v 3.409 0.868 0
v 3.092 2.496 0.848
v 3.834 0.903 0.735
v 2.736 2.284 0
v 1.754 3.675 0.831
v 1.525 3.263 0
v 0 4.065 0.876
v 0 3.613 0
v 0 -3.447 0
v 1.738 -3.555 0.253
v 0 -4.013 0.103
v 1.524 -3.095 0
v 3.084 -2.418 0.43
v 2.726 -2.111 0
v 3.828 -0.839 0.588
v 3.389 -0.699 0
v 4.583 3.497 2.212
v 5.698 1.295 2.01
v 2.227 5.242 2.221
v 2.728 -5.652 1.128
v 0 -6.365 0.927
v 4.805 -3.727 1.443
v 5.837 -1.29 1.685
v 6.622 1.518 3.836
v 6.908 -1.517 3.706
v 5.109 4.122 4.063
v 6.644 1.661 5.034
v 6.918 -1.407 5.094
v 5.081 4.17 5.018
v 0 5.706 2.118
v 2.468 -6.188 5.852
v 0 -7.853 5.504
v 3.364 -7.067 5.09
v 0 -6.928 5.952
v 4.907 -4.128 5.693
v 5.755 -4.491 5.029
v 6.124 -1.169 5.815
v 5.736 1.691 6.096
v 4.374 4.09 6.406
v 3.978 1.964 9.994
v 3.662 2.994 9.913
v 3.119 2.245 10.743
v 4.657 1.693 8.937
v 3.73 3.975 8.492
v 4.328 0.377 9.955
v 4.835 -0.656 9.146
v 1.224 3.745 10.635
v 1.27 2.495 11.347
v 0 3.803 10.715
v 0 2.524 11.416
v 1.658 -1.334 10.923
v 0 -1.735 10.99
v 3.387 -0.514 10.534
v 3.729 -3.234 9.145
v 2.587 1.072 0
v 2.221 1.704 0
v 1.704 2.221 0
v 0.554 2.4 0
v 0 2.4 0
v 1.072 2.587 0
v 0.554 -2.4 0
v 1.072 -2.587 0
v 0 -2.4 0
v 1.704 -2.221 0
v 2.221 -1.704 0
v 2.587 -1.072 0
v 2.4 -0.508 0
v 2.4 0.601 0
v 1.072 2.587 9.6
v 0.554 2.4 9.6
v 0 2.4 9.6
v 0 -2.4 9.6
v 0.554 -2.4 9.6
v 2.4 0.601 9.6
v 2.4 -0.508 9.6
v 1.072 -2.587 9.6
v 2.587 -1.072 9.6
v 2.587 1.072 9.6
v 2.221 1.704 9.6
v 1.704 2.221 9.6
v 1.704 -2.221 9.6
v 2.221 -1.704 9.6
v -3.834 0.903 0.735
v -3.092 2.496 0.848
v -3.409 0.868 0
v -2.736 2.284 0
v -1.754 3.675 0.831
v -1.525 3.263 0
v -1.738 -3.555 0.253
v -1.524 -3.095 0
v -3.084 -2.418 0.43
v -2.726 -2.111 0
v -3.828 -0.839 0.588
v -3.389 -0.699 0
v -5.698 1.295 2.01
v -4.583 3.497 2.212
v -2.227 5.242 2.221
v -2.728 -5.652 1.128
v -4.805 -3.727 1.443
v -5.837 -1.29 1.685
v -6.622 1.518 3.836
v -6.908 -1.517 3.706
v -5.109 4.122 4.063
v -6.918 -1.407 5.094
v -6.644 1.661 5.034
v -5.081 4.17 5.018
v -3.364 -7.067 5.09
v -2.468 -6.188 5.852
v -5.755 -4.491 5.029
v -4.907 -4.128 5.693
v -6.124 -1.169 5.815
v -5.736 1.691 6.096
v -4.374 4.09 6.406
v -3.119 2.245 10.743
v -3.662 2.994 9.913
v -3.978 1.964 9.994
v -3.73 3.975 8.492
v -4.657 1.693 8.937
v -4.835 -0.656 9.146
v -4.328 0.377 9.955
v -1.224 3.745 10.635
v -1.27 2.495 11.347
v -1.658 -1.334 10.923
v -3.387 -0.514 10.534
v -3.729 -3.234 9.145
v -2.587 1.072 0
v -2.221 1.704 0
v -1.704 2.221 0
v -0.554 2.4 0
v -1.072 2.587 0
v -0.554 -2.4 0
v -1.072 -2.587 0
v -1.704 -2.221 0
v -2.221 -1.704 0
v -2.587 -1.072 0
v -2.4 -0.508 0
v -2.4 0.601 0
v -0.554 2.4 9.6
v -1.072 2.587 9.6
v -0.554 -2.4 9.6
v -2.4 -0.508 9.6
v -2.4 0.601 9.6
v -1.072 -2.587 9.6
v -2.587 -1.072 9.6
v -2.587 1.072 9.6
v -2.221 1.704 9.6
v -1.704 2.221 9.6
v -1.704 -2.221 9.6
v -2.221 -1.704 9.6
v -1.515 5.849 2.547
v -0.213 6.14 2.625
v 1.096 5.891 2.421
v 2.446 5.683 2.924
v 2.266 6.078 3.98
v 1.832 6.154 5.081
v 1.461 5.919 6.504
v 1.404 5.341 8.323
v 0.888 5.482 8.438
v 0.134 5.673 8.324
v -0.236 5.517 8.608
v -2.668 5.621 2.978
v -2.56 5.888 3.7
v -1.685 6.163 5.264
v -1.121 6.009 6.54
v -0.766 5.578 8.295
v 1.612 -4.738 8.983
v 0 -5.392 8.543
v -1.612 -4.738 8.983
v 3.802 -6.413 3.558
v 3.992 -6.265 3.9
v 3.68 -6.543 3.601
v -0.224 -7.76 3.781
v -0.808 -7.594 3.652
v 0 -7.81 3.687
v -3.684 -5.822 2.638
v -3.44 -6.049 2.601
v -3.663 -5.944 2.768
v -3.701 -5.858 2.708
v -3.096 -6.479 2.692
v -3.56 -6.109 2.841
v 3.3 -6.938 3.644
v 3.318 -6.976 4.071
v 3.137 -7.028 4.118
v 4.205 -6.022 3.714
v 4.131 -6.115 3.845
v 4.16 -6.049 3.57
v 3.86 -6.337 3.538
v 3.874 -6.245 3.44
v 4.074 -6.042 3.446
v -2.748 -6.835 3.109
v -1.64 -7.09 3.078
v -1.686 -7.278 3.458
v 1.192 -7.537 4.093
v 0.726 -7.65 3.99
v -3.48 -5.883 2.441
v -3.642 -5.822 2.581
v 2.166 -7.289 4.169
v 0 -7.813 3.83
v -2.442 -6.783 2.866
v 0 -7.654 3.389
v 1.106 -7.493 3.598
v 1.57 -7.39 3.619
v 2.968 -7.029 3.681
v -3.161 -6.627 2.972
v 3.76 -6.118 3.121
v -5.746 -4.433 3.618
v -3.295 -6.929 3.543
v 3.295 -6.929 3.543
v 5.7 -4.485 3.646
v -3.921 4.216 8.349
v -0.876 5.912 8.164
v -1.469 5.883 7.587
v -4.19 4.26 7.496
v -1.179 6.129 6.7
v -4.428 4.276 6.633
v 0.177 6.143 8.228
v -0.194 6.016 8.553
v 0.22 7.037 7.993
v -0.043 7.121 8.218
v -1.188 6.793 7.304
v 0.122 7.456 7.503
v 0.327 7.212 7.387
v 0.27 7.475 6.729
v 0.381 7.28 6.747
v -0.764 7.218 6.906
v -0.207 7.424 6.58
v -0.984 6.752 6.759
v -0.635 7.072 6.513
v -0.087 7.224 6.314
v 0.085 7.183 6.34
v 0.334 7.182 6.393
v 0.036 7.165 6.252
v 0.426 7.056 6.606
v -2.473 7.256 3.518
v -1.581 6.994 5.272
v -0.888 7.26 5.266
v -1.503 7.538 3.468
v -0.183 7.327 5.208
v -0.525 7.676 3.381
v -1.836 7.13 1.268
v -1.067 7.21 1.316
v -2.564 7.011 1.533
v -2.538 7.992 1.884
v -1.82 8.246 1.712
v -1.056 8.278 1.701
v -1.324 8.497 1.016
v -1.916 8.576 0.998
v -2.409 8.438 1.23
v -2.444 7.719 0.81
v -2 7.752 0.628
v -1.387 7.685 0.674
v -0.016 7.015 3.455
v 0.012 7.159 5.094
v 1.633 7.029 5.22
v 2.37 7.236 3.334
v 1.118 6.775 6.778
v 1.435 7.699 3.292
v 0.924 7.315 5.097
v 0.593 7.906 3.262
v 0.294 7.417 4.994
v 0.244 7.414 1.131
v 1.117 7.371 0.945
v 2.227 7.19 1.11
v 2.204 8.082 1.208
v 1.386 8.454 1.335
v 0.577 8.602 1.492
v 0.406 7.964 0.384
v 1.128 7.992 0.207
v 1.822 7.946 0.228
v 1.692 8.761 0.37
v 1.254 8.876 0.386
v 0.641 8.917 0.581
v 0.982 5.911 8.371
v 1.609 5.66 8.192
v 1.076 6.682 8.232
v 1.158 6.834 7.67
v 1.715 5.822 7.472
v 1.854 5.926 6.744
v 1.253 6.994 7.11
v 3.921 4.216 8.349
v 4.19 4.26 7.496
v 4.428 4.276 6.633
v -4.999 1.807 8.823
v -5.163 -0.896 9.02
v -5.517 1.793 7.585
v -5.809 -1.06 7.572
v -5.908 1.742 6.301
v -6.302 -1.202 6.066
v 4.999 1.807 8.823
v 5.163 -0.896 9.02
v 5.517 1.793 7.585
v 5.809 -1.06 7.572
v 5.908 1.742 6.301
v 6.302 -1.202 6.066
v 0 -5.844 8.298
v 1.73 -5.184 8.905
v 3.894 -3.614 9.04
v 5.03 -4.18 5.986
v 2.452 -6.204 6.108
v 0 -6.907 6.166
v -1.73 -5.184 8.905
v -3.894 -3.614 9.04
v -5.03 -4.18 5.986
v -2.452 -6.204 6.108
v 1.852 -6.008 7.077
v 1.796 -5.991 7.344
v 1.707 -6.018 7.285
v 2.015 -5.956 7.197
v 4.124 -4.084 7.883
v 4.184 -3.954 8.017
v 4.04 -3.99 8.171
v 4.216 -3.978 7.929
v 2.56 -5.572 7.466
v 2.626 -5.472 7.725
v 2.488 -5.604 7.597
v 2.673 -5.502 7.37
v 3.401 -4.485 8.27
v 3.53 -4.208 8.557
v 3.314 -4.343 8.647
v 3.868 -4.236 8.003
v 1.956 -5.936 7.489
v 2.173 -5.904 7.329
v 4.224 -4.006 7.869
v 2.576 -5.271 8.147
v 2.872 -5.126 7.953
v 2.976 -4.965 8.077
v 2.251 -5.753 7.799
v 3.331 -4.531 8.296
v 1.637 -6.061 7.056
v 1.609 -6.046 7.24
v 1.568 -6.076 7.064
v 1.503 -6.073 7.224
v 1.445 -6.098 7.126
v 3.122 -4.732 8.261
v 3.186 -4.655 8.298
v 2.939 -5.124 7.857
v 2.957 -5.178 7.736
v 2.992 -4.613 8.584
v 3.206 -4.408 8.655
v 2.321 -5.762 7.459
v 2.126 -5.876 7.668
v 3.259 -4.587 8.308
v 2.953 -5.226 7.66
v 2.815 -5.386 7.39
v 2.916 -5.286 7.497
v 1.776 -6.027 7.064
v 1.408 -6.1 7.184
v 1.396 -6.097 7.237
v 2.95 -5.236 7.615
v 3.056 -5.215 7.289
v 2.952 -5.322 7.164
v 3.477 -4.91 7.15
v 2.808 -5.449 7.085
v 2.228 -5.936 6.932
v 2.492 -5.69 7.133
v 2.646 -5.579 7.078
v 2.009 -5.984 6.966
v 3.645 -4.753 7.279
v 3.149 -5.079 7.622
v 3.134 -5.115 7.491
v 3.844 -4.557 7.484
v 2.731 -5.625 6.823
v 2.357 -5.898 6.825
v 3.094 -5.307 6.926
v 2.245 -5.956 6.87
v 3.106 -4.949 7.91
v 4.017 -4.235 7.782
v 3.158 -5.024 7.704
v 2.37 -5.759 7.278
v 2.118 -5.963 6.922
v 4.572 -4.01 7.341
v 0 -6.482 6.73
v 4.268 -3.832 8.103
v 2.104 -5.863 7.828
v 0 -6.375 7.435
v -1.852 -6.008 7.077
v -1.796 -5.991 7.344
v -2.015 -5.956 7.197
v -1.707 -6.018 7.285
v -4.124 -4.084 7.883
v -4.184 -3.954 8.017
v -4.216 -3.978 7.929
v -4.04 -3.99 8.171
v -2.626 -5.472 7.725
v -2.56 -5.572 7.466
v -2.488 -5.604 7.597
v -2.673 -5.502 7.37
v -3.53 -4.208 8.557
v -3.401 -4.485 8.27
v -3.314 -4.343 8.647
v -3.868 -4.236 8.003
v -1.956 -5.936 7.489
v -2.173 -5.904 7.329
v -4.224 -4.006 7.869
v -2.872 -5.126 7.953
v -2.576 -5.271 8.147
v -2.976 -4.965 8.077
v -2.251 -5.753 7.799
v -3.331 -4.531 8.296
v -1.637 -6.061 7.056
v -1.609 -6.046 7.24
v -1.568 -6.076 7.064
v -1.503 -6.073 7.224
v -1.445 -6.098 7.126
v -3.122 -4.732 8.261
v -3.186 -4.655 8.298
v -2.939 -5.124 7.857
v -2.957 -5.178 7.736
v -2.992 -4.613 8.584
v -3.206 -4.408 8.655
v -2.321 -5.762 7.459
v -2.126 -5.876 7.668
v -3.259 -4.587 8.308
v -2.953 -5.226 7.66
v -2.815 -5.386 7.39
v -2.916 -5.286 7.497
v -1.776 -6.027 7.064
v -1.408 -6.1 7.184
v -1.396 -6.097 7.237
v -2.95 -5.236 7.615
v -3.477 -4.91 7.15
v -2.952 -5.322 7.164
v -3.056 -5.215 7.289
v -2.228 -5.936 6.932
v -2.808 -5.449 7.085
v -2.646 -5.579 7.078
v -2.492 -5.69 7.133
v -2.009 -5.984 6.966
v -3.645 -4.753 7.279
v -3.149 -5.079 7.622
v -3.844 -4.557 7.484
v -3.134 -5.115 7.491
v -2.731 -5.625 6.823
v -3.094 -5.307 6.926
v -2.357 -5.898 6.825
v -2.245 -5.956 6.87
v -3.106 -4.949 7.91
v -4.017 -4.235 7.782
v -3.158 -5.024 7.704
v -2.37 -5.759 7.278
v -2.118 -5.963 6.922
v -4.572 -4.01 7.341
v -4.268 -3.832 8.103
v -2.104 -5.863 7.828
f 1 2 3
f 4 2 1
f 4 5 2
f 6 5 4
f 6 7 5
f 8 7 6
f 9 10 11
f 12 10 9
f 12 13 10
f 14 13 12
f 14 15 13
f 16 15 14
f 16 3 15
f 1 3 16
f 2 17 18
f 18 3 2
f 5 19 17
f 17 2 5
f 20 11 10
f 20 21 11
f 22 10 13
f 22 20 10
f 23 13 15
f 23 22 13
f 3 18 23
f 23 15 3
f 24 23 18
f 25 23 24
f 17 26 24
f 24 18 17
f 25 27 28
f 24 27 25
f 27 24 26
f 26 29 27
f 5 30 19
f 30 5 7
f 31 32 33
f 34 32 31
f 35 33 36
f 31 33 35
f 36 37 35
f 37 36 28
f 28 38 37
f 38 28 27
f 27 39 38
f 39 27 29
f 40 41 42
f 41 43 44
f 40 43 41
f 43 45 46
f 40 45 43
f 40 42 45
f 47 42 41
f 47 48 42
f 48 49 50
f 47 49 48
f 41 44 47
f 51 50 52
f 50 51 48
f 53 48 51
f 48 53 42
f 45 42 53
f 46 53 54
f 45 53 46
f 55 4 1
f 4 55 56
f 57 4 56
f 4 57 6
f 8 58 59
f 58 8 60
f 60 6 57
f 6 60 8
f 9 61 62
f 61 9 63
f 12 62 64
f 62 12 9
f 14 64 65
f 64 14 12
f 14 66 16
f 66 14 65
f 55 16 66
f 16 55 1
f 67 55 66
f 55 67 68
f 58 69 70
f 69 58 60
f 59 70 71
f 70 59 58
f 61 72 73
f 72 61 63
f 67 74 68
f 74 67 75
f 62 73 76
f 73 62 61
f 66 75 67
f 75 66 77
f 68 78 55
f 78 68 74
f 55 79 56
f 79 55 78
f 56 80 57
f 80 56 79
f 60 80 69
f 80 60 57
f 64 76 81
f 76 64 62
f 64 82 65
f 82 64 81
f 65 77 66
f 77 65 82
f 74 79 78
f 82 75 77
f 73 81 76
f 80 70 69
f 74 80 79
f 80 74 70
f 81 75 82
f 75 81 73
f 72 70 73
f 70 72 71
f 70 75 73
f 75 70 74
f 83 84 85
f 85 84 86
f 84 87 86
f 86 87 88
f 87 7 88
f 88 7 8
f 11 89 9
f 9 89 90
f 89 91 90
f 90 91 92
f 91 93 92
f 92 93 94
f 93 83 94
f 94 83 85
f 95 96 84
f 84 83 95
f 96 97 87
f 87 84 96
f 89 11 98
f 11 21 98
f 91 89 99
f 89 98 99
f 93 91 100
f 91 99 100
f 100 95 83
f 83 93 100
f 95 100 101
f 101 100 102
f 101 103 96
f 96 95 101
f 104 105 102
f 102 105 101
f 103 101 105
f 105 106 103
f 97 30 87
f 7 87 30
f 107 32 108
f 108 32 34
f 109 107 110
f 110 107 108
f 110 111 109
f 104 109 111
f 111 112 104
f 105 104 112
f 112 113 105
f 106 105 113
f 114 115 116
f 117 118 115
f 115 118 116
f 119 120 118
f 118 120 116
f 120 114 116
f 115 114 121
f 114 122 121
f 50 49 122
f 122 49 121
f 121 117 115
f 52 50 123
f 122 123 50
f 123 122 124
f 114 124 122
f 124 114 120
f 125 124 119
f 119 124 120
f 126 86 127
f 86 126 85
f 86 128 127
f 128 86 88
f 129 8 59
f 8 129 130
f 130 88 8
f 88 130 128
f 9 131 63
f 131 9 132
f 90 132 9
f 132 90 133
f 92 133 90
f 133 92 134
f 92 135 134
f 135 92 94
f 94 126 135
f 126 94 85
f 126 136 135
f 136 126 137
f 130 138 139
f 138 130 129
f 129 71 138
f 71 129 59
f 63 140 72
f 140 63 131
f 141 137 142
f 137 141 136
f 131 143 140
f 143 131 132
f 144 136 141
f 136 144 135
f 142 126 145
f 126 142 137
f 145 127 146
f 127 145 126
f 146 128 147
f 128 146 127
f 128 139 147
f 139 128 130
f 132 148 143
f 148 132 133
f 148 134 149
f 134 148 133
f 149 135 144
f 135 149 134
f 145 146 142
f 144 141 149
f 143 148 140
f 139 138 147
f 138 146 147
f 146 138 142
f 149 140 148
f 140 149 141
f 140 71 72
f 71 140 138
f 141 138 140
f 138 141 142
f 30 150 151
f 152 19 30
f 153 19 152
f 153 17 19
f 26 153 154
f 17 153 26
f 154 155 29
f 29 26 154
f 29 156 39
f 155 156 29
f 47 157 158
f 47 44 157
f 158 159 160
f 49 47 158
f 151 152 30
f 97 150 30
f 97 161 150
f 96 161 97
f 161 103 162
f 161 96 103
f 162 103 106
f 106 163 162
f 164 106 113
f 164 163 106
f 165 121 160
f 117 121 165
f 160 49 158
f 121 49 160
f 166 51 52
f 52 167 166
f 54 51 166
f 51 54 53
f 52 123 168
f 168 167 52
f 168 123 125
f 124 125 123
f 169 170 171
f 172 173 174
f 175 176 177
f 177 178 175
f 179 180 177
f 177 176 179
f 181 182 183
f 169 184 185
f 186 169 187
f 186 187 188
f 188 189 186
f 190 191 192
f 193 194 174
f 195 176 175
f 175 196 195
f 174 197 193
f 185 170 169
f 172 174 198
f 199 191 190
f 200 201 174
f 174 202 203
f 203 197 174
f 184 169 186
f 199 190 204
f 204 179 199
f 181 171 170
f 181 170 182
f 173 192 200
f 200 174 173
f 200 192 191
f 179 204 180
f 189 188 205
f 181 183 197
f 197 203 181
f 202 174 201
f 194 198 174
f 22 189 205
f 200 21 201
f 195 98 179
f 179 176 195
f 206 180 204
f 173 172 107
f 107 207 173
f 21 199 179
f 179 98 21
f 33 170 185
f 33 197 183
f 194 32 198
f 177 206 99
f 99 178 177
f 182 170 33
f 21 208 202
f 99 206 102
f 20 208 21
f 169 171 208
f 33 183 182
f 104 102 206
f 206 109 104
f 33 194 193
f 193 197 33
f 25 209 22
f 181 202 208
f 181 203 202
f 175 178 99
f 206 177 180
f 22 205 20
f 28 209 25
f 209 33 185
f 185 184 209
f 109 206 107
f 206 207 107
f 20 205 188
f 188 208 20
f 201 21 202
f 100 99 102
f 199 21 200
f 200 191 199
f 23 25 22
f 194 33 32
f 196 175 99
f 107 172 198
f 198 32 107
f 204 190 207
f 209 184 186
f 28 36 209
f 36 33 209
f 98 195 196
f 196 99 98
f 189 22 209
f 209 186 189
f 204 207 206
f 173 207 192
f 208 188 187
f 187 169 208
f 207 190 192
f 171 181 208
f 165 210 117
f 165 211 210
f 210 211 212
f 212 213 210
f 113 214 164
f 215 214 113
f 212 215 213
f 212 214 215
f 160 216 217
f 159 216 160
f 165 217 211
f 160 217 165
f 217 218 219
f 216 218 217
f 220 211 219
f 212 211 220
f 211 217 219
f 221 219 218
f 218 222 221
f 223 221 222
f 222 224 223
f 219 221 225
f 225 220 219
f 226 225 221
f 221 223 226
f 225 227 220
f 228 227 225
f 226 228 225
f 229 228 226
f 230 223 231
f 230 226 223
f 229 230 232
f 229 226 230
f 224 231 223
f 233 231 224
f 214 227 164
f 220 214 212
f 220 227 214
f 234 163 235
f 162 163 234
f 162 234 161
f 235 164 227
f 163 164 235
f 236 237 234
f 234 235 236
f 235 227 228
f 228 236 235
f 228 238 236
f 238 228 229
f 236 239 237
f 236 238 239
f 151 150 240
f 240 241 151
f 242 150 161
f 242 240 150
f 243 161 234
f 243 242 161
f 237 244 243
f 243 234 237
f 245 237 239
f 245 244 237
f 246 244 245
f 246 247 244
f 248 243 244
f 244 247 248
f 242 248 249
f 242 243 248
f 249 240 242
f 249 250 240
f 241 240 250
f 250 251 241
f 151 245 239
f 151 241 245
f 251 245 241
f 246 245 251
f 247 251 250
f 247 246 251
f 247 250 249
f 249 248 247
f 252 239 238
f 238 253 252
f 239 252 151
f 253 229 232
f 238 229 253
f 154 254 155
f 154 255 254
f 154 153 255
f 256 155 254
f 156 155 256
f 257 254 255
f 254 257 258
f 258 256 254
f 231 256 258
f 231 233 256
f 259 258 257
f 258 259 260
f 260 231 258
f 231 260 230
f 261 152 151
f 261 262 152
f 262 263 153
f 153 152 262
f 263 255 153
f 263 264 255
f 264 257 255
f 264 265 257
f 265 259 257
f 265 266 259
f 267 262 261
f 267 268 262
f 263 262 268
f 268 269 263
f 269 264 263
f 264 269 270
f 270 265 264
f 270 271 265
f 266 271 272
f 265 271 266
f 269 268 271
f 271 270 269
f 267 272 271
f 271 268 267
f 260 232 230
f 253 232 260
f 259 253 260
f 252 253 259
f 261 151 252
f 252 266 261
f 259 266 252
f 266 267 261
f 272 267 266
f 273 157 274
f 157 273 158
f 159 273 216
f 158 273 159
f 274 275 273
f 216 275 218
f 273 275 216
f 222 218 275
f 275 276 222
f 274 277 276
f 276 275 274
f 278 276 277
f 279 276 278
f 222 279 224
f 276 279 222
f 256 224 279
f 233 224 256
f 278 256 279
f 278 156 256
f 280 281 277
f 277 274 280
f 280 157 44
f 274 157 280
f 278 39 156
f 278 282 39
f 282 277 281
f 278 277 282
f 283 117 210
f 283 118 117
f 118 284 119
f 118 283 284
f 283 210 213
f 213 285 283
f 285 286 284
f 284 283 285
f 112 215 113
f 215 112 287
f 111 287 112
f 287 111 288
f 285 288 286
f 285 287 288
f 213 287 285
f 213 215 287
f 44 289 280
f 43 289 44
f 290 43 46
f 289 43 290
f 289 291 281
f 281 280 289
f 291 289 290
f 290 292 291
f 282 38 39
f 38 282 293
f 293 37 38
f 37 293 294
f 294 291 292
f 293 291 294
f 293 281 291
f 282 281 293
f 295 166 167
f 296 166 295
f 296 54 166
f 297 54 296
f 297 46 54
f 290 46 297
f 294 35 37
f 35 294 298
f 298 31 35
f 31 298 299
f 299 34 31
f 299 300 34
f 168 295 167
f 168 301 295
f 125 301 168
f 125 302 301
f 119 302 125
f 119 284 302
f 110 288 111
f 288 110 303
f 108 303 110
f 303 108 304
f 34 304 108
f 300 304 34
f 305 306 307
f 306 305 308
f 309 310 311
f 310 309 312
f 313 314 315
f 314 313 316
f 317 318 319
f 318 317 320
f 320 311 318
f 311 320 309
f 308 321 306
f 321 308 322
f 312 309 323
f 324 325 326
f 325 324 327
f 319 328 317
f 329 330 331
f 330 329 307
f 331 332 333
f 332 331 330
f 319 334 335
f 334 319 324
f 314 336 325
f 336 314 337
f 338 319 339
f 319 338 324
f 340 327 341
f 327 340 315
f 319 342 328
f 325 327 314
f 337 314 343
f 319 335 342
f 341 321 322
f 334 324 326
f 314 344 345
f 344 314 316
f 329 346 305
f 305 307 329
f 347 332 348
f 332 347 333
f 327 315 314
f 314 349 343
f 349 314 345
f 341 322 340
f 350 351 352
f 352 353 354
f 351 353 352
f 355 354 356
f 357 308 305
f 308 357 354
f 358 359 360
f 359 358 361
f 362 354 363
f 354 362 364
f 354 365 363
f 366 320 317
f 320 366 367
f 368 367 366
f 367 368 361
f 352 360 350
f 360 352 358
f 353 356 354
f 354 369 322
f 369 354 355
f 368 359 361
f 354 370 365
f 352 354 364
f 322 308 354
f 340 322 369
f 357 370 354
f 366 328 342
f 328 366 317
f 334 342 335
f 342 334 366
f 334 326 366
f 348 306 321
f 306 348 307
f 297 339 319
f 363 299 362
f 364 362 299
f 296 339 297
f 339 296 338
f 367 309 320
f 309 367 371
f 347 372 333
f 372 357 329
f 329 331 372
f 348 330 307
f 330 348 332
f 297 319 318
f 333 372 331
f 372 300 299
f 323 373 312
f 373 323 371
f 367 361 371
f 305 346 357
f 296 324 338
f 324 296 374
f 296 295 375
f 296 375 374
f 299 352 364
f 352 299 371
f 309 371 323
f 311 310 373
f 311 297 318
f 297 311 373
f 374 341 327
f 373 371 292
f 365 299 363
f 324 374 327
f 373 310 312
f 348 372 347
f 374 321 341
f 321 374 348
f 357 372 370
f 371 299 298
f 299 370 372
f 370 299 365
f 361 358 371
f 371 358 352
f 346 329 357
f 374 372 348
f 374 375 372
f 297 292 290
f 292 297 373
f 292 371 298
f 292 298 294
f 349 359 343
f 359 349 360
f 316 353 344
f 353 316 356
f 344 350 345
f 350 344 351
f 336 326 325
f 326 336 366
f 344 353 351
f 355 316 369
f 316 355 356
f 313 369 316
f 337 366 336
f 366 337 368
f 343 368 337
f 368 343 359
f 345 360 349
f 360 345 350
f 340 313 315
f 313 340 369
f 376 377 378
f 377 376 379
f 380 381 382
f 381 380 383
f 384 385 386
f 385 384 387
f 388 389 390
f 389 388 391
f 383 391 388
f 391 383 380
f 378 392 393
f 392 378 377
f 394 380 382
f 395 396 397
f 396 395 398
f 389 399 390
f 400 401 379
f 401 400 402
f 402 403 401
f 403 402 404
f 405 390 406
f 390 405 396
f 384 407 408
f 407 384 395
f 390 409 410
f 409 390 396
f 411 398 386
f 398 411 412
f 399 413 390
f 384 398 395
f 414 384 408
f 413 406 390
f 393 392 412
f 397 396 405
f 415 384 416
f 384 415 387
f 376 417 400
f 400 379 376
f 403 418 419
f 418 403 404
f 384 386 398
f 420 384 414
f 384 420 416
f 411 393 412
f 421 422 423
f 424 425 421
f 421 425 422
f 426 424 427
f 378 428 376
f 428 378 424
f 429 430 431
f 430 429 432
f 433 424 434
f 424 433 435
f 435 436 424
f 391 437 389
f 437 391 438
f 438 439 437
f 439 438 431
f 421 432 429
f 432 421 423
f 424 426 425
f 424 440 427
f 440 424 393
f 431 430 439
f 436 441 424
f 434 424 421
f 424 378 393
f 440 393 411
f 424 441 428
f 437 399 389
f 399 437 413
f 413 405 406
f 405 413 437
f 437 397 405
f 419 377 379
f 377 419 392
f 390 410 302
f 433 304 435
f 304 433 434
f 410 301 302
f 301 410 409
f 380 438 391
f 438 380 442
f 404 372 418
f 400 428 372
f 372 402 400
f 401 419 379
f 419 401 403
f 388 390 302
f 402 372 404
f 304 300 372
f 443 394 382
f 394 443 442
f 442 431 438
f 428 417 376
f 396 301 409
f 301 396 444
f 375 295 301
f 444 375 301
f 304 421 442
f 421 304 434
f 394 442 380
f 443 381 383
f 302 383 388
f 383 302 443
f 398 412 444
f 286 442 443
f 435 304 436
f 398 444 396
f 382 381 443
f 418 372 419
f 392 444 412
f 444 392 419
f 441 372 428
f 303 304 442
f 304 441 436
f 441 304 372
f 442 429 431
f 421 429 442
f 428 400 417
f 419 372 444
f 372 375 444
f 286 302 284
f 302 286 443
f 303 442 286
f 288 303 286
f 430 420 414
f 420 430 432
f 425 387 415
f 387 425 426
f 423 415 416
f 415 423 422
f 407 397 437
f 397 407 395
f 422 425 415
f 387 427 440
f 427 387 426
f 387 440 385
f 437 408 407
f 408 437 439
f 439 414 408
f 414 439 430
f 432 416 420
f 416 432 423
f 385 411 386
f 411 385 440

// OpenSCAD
use <../lib.scad>
use <s/12607p01s03.scad>
use <s/12607p01s04.scad>
use <s/12607s01.scad>
use <s/12607s02.scad>
use <s/12607s05.scad>
function ldraw_lib__12607p01() = [
// 0 Minifig Head Ninja Turtle with Leonardo Looking Up Pattern
// 0 Name: 12607p01.dat
// 0 Author: Chris Böhnke [KnightOfTarenta]
// 0 !LDRAW_ORG Part UPDATE 2026-03
// 0 !LICENSE Licensed under CC BY 4.0 : see CAreadme.txt
// 
// 0 BFC CERTIFY CCW
  [0,"BFC","CERTIFY"],
  [0,"BFC","CCW"],
// 
// 0 !KEYWORDS Bricklink 12607pb02, Brickowl 804339, Brickset 13007, Juniors, Leo
// 0 !KEYWORDS Nickelodeon, Rebrickable 12607c01pr0001, Set 10669, Set 79103
// 0 !KEYWORDS Teenage Mutant Ninja Turtles, TMNT
// 
// 0 !HISTORY 2026-03-31 [OrionP] Official Update 2026-03
// 
// 0 // Main Part
// 1 16 0 0 0 1 0 0 0 1 0 0 0 1 s\12607s01.dat
  [1,16,0,0,0,1,0,0,0,1,0,0,0,1, ldraw_lib__s__12607s01()],
// 1 16 0 0 0 -1 0 0 0 1 0 0 0 1 s\12607s01.dat
  [1,16,0,0,0,-1,0,0,0,1,0,0,0,1, ldraw_lib__s__12607s01()],
// 1 16 0 0 0 1 0 0 0 1 0 0 0 1 s\12607s05.dat
  [1,16,0,0,0,1,0,0,0,1,0,0,0,1, ldraw_lib__s__12607s05()],
// 1 16 0 0 0 1 0 0 0 1 0 0 0 1 s\12607p01s03.dat
  [1,16,0,0,0,1,0,0,0,1,0,0,0,1, ldraw_lib__s__12607p01s03()],
// 
// 0 // Mask
// 1 1 0 0 0 1 0 0 0 1 0 0 0 1 s\12607s02.dat
  [1,1,0,0,0,1,0,0,0,1,0,0,0,1, ldraw_lib__s__12607s02()],
// 1 1 0 0 0 1 0 0 0 1 0 0 0 1 s\12607p01s04.dat
  [1,1,0,0,0,1,0,0,0,1,0,0,0,1, ldraw_lib__s__12607p01s04()],
// 1 1 0 0 0 -1 0 0 0 1 0 0 0 1 s\12607p01s04.dat
  [1,1,0,0,0,-1,0,0,0,1,0,0,0,1, ldraw_lib__s__12607p01s04()],
];
module ldraw_lib__12607p01(step=0, col=false, unit=2/5, alt=false, line=0.2, solid=!$preview)
    makepoly(ldraw_lib__12607p01(), step=step, col=col, unit=unit, alt=alt, line=line, solid=solid);
ldraw_lib__12607p01(line=0.2);
